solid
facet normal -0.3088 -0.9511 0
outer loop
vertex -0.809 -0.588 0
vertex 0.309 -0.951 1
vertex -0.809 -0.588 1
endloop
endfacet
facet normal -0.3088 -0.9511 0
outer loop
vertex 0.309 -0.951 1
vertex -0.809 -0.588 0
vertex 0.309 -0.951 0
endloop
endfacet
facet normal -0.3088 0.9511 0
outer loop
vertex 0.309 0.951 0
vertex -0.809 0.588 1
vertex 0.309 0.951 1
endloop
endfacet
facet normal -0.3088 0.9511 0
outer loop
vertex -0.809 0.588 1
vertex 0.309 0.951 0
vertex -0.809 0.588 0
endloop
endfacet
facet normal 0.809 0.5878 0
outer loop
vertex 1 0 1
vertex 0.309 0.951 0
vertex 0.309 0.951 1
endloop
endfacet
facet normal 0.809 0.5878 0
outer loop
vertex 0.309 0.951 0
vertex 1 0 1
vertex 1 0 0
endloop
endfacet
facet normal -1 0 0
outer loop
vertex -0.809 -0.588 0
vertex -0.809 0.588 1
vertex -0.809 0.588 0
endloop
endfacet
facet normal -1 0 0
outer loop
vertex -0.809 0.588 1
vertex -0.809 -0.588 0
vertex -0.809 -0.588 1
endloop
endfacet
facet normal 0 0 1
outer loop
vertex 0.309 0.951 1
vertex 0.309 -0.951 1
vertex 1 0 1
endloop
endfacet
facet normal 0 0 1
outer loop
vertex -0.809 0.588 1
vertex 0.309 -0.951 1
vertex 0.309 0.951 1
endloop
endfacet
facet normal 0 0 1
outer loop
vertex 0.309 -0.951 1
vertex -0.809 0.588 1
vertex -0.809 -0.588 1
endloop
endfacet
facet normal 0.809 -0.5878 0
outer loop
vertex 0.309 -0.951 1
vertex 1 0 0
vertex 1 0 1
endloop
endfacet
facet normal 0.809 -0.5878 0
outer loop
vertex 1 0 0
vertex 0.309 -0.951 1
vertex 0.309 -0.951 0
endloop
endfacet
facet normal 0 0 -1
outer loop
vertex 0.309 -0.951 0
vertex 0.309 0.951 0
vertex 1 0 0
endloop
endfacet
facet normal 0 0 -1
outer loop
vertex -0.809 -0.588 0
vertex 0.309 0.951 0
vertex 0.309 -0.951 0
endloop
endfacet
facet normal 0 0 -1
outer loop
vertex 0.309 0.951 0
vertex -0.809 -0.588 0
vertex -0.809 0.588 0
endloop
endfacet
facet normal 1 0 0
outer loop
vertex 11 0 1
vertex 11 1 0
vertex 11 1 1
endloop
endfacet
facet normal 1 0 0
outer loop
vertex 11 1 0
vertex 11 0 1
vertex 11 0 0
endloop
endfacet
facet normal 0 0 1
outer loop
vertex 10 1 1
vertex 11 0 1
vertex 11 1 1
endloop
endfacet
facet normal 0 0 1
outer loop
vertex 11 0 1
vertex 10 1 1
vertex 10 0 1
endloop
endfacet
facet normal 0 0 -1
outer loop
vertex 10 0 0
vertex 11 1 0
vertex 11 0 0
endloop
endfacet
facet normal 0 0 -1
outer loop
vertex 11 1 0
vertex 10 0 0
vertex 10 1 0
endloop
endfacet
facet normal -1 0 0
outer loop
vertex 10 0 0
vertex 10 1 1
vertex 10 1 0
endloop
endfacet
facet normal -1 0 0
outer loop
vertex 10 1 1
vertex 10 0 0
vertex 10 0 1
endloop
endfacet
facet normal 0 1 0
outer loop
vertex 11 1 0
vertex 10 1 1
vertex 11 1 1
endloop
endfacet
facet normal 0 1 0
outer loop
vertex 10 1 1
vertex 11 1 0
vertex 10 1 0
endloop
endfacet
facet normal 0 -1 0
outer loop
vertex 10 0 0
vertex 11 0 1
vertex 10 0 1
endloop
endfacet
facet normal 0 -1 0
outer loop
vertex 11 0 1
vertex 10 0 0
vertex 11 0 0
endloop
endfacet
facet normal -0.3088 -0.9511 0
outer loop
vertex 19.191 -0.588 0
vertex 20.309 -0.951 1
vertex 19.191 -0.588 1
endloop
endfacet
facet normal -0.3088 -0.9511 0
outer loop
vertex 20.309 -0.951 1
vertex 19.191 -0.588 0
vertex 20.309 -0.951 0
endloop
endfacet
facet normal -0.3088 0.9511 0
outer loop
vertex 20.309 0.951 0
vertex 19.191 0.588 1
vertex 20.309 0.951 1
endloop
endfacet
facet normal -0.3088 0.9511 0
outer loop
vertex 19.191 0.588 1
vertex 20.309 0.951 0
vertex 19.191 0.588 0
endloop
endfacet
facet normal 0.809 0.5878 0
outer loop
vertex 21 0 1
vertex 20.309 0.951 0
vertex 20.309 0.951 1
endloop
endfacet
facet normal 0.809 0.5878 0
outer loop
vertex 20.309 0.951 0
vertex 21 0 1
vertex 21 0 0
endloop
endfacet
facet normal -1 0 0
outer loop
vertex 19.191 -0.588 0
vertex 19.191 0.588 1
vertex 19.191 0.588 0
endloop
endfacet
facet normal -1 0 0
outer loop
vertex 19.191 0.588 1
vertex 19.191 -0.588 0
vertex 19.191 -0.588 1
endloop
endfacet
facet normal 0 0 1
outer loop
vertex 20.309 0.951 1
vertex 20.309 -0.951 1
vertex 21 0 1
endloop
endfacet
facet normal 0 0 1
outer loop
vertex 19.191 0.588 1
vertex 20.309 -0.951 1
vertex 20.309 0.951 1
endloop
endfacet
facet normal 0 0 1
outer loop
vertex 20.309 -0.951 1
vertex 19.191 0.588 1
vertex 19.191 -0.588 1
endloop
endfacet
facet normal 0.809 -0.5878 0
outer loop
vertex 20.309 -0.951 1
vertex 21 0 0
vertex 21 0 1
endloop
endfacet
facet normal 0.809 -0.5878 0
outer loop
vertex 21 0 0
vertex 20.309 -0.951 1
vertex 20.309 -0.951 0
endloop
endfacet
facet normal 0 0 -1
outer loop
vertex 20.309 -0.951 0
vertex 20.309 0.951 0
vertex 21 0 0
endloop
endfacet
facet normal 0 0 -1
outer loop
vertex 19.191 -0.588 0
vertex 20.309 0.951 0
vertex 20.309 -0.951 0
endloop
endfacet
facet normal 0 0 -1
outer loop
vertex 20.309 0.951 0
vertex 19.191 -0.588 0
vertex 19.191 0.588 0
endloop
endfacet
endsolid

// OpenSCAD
separate(10) {cylinder(); cube(); cylinder();}


// =================================================
// === LIB STARTS HERE =============================


module lift(z=0){
    translate([0,0,z]) children();
}


module separate(shift=0){
    for (i=[0:$children]){
        translate([shift*i,0,0]) children(i);
    }
}
